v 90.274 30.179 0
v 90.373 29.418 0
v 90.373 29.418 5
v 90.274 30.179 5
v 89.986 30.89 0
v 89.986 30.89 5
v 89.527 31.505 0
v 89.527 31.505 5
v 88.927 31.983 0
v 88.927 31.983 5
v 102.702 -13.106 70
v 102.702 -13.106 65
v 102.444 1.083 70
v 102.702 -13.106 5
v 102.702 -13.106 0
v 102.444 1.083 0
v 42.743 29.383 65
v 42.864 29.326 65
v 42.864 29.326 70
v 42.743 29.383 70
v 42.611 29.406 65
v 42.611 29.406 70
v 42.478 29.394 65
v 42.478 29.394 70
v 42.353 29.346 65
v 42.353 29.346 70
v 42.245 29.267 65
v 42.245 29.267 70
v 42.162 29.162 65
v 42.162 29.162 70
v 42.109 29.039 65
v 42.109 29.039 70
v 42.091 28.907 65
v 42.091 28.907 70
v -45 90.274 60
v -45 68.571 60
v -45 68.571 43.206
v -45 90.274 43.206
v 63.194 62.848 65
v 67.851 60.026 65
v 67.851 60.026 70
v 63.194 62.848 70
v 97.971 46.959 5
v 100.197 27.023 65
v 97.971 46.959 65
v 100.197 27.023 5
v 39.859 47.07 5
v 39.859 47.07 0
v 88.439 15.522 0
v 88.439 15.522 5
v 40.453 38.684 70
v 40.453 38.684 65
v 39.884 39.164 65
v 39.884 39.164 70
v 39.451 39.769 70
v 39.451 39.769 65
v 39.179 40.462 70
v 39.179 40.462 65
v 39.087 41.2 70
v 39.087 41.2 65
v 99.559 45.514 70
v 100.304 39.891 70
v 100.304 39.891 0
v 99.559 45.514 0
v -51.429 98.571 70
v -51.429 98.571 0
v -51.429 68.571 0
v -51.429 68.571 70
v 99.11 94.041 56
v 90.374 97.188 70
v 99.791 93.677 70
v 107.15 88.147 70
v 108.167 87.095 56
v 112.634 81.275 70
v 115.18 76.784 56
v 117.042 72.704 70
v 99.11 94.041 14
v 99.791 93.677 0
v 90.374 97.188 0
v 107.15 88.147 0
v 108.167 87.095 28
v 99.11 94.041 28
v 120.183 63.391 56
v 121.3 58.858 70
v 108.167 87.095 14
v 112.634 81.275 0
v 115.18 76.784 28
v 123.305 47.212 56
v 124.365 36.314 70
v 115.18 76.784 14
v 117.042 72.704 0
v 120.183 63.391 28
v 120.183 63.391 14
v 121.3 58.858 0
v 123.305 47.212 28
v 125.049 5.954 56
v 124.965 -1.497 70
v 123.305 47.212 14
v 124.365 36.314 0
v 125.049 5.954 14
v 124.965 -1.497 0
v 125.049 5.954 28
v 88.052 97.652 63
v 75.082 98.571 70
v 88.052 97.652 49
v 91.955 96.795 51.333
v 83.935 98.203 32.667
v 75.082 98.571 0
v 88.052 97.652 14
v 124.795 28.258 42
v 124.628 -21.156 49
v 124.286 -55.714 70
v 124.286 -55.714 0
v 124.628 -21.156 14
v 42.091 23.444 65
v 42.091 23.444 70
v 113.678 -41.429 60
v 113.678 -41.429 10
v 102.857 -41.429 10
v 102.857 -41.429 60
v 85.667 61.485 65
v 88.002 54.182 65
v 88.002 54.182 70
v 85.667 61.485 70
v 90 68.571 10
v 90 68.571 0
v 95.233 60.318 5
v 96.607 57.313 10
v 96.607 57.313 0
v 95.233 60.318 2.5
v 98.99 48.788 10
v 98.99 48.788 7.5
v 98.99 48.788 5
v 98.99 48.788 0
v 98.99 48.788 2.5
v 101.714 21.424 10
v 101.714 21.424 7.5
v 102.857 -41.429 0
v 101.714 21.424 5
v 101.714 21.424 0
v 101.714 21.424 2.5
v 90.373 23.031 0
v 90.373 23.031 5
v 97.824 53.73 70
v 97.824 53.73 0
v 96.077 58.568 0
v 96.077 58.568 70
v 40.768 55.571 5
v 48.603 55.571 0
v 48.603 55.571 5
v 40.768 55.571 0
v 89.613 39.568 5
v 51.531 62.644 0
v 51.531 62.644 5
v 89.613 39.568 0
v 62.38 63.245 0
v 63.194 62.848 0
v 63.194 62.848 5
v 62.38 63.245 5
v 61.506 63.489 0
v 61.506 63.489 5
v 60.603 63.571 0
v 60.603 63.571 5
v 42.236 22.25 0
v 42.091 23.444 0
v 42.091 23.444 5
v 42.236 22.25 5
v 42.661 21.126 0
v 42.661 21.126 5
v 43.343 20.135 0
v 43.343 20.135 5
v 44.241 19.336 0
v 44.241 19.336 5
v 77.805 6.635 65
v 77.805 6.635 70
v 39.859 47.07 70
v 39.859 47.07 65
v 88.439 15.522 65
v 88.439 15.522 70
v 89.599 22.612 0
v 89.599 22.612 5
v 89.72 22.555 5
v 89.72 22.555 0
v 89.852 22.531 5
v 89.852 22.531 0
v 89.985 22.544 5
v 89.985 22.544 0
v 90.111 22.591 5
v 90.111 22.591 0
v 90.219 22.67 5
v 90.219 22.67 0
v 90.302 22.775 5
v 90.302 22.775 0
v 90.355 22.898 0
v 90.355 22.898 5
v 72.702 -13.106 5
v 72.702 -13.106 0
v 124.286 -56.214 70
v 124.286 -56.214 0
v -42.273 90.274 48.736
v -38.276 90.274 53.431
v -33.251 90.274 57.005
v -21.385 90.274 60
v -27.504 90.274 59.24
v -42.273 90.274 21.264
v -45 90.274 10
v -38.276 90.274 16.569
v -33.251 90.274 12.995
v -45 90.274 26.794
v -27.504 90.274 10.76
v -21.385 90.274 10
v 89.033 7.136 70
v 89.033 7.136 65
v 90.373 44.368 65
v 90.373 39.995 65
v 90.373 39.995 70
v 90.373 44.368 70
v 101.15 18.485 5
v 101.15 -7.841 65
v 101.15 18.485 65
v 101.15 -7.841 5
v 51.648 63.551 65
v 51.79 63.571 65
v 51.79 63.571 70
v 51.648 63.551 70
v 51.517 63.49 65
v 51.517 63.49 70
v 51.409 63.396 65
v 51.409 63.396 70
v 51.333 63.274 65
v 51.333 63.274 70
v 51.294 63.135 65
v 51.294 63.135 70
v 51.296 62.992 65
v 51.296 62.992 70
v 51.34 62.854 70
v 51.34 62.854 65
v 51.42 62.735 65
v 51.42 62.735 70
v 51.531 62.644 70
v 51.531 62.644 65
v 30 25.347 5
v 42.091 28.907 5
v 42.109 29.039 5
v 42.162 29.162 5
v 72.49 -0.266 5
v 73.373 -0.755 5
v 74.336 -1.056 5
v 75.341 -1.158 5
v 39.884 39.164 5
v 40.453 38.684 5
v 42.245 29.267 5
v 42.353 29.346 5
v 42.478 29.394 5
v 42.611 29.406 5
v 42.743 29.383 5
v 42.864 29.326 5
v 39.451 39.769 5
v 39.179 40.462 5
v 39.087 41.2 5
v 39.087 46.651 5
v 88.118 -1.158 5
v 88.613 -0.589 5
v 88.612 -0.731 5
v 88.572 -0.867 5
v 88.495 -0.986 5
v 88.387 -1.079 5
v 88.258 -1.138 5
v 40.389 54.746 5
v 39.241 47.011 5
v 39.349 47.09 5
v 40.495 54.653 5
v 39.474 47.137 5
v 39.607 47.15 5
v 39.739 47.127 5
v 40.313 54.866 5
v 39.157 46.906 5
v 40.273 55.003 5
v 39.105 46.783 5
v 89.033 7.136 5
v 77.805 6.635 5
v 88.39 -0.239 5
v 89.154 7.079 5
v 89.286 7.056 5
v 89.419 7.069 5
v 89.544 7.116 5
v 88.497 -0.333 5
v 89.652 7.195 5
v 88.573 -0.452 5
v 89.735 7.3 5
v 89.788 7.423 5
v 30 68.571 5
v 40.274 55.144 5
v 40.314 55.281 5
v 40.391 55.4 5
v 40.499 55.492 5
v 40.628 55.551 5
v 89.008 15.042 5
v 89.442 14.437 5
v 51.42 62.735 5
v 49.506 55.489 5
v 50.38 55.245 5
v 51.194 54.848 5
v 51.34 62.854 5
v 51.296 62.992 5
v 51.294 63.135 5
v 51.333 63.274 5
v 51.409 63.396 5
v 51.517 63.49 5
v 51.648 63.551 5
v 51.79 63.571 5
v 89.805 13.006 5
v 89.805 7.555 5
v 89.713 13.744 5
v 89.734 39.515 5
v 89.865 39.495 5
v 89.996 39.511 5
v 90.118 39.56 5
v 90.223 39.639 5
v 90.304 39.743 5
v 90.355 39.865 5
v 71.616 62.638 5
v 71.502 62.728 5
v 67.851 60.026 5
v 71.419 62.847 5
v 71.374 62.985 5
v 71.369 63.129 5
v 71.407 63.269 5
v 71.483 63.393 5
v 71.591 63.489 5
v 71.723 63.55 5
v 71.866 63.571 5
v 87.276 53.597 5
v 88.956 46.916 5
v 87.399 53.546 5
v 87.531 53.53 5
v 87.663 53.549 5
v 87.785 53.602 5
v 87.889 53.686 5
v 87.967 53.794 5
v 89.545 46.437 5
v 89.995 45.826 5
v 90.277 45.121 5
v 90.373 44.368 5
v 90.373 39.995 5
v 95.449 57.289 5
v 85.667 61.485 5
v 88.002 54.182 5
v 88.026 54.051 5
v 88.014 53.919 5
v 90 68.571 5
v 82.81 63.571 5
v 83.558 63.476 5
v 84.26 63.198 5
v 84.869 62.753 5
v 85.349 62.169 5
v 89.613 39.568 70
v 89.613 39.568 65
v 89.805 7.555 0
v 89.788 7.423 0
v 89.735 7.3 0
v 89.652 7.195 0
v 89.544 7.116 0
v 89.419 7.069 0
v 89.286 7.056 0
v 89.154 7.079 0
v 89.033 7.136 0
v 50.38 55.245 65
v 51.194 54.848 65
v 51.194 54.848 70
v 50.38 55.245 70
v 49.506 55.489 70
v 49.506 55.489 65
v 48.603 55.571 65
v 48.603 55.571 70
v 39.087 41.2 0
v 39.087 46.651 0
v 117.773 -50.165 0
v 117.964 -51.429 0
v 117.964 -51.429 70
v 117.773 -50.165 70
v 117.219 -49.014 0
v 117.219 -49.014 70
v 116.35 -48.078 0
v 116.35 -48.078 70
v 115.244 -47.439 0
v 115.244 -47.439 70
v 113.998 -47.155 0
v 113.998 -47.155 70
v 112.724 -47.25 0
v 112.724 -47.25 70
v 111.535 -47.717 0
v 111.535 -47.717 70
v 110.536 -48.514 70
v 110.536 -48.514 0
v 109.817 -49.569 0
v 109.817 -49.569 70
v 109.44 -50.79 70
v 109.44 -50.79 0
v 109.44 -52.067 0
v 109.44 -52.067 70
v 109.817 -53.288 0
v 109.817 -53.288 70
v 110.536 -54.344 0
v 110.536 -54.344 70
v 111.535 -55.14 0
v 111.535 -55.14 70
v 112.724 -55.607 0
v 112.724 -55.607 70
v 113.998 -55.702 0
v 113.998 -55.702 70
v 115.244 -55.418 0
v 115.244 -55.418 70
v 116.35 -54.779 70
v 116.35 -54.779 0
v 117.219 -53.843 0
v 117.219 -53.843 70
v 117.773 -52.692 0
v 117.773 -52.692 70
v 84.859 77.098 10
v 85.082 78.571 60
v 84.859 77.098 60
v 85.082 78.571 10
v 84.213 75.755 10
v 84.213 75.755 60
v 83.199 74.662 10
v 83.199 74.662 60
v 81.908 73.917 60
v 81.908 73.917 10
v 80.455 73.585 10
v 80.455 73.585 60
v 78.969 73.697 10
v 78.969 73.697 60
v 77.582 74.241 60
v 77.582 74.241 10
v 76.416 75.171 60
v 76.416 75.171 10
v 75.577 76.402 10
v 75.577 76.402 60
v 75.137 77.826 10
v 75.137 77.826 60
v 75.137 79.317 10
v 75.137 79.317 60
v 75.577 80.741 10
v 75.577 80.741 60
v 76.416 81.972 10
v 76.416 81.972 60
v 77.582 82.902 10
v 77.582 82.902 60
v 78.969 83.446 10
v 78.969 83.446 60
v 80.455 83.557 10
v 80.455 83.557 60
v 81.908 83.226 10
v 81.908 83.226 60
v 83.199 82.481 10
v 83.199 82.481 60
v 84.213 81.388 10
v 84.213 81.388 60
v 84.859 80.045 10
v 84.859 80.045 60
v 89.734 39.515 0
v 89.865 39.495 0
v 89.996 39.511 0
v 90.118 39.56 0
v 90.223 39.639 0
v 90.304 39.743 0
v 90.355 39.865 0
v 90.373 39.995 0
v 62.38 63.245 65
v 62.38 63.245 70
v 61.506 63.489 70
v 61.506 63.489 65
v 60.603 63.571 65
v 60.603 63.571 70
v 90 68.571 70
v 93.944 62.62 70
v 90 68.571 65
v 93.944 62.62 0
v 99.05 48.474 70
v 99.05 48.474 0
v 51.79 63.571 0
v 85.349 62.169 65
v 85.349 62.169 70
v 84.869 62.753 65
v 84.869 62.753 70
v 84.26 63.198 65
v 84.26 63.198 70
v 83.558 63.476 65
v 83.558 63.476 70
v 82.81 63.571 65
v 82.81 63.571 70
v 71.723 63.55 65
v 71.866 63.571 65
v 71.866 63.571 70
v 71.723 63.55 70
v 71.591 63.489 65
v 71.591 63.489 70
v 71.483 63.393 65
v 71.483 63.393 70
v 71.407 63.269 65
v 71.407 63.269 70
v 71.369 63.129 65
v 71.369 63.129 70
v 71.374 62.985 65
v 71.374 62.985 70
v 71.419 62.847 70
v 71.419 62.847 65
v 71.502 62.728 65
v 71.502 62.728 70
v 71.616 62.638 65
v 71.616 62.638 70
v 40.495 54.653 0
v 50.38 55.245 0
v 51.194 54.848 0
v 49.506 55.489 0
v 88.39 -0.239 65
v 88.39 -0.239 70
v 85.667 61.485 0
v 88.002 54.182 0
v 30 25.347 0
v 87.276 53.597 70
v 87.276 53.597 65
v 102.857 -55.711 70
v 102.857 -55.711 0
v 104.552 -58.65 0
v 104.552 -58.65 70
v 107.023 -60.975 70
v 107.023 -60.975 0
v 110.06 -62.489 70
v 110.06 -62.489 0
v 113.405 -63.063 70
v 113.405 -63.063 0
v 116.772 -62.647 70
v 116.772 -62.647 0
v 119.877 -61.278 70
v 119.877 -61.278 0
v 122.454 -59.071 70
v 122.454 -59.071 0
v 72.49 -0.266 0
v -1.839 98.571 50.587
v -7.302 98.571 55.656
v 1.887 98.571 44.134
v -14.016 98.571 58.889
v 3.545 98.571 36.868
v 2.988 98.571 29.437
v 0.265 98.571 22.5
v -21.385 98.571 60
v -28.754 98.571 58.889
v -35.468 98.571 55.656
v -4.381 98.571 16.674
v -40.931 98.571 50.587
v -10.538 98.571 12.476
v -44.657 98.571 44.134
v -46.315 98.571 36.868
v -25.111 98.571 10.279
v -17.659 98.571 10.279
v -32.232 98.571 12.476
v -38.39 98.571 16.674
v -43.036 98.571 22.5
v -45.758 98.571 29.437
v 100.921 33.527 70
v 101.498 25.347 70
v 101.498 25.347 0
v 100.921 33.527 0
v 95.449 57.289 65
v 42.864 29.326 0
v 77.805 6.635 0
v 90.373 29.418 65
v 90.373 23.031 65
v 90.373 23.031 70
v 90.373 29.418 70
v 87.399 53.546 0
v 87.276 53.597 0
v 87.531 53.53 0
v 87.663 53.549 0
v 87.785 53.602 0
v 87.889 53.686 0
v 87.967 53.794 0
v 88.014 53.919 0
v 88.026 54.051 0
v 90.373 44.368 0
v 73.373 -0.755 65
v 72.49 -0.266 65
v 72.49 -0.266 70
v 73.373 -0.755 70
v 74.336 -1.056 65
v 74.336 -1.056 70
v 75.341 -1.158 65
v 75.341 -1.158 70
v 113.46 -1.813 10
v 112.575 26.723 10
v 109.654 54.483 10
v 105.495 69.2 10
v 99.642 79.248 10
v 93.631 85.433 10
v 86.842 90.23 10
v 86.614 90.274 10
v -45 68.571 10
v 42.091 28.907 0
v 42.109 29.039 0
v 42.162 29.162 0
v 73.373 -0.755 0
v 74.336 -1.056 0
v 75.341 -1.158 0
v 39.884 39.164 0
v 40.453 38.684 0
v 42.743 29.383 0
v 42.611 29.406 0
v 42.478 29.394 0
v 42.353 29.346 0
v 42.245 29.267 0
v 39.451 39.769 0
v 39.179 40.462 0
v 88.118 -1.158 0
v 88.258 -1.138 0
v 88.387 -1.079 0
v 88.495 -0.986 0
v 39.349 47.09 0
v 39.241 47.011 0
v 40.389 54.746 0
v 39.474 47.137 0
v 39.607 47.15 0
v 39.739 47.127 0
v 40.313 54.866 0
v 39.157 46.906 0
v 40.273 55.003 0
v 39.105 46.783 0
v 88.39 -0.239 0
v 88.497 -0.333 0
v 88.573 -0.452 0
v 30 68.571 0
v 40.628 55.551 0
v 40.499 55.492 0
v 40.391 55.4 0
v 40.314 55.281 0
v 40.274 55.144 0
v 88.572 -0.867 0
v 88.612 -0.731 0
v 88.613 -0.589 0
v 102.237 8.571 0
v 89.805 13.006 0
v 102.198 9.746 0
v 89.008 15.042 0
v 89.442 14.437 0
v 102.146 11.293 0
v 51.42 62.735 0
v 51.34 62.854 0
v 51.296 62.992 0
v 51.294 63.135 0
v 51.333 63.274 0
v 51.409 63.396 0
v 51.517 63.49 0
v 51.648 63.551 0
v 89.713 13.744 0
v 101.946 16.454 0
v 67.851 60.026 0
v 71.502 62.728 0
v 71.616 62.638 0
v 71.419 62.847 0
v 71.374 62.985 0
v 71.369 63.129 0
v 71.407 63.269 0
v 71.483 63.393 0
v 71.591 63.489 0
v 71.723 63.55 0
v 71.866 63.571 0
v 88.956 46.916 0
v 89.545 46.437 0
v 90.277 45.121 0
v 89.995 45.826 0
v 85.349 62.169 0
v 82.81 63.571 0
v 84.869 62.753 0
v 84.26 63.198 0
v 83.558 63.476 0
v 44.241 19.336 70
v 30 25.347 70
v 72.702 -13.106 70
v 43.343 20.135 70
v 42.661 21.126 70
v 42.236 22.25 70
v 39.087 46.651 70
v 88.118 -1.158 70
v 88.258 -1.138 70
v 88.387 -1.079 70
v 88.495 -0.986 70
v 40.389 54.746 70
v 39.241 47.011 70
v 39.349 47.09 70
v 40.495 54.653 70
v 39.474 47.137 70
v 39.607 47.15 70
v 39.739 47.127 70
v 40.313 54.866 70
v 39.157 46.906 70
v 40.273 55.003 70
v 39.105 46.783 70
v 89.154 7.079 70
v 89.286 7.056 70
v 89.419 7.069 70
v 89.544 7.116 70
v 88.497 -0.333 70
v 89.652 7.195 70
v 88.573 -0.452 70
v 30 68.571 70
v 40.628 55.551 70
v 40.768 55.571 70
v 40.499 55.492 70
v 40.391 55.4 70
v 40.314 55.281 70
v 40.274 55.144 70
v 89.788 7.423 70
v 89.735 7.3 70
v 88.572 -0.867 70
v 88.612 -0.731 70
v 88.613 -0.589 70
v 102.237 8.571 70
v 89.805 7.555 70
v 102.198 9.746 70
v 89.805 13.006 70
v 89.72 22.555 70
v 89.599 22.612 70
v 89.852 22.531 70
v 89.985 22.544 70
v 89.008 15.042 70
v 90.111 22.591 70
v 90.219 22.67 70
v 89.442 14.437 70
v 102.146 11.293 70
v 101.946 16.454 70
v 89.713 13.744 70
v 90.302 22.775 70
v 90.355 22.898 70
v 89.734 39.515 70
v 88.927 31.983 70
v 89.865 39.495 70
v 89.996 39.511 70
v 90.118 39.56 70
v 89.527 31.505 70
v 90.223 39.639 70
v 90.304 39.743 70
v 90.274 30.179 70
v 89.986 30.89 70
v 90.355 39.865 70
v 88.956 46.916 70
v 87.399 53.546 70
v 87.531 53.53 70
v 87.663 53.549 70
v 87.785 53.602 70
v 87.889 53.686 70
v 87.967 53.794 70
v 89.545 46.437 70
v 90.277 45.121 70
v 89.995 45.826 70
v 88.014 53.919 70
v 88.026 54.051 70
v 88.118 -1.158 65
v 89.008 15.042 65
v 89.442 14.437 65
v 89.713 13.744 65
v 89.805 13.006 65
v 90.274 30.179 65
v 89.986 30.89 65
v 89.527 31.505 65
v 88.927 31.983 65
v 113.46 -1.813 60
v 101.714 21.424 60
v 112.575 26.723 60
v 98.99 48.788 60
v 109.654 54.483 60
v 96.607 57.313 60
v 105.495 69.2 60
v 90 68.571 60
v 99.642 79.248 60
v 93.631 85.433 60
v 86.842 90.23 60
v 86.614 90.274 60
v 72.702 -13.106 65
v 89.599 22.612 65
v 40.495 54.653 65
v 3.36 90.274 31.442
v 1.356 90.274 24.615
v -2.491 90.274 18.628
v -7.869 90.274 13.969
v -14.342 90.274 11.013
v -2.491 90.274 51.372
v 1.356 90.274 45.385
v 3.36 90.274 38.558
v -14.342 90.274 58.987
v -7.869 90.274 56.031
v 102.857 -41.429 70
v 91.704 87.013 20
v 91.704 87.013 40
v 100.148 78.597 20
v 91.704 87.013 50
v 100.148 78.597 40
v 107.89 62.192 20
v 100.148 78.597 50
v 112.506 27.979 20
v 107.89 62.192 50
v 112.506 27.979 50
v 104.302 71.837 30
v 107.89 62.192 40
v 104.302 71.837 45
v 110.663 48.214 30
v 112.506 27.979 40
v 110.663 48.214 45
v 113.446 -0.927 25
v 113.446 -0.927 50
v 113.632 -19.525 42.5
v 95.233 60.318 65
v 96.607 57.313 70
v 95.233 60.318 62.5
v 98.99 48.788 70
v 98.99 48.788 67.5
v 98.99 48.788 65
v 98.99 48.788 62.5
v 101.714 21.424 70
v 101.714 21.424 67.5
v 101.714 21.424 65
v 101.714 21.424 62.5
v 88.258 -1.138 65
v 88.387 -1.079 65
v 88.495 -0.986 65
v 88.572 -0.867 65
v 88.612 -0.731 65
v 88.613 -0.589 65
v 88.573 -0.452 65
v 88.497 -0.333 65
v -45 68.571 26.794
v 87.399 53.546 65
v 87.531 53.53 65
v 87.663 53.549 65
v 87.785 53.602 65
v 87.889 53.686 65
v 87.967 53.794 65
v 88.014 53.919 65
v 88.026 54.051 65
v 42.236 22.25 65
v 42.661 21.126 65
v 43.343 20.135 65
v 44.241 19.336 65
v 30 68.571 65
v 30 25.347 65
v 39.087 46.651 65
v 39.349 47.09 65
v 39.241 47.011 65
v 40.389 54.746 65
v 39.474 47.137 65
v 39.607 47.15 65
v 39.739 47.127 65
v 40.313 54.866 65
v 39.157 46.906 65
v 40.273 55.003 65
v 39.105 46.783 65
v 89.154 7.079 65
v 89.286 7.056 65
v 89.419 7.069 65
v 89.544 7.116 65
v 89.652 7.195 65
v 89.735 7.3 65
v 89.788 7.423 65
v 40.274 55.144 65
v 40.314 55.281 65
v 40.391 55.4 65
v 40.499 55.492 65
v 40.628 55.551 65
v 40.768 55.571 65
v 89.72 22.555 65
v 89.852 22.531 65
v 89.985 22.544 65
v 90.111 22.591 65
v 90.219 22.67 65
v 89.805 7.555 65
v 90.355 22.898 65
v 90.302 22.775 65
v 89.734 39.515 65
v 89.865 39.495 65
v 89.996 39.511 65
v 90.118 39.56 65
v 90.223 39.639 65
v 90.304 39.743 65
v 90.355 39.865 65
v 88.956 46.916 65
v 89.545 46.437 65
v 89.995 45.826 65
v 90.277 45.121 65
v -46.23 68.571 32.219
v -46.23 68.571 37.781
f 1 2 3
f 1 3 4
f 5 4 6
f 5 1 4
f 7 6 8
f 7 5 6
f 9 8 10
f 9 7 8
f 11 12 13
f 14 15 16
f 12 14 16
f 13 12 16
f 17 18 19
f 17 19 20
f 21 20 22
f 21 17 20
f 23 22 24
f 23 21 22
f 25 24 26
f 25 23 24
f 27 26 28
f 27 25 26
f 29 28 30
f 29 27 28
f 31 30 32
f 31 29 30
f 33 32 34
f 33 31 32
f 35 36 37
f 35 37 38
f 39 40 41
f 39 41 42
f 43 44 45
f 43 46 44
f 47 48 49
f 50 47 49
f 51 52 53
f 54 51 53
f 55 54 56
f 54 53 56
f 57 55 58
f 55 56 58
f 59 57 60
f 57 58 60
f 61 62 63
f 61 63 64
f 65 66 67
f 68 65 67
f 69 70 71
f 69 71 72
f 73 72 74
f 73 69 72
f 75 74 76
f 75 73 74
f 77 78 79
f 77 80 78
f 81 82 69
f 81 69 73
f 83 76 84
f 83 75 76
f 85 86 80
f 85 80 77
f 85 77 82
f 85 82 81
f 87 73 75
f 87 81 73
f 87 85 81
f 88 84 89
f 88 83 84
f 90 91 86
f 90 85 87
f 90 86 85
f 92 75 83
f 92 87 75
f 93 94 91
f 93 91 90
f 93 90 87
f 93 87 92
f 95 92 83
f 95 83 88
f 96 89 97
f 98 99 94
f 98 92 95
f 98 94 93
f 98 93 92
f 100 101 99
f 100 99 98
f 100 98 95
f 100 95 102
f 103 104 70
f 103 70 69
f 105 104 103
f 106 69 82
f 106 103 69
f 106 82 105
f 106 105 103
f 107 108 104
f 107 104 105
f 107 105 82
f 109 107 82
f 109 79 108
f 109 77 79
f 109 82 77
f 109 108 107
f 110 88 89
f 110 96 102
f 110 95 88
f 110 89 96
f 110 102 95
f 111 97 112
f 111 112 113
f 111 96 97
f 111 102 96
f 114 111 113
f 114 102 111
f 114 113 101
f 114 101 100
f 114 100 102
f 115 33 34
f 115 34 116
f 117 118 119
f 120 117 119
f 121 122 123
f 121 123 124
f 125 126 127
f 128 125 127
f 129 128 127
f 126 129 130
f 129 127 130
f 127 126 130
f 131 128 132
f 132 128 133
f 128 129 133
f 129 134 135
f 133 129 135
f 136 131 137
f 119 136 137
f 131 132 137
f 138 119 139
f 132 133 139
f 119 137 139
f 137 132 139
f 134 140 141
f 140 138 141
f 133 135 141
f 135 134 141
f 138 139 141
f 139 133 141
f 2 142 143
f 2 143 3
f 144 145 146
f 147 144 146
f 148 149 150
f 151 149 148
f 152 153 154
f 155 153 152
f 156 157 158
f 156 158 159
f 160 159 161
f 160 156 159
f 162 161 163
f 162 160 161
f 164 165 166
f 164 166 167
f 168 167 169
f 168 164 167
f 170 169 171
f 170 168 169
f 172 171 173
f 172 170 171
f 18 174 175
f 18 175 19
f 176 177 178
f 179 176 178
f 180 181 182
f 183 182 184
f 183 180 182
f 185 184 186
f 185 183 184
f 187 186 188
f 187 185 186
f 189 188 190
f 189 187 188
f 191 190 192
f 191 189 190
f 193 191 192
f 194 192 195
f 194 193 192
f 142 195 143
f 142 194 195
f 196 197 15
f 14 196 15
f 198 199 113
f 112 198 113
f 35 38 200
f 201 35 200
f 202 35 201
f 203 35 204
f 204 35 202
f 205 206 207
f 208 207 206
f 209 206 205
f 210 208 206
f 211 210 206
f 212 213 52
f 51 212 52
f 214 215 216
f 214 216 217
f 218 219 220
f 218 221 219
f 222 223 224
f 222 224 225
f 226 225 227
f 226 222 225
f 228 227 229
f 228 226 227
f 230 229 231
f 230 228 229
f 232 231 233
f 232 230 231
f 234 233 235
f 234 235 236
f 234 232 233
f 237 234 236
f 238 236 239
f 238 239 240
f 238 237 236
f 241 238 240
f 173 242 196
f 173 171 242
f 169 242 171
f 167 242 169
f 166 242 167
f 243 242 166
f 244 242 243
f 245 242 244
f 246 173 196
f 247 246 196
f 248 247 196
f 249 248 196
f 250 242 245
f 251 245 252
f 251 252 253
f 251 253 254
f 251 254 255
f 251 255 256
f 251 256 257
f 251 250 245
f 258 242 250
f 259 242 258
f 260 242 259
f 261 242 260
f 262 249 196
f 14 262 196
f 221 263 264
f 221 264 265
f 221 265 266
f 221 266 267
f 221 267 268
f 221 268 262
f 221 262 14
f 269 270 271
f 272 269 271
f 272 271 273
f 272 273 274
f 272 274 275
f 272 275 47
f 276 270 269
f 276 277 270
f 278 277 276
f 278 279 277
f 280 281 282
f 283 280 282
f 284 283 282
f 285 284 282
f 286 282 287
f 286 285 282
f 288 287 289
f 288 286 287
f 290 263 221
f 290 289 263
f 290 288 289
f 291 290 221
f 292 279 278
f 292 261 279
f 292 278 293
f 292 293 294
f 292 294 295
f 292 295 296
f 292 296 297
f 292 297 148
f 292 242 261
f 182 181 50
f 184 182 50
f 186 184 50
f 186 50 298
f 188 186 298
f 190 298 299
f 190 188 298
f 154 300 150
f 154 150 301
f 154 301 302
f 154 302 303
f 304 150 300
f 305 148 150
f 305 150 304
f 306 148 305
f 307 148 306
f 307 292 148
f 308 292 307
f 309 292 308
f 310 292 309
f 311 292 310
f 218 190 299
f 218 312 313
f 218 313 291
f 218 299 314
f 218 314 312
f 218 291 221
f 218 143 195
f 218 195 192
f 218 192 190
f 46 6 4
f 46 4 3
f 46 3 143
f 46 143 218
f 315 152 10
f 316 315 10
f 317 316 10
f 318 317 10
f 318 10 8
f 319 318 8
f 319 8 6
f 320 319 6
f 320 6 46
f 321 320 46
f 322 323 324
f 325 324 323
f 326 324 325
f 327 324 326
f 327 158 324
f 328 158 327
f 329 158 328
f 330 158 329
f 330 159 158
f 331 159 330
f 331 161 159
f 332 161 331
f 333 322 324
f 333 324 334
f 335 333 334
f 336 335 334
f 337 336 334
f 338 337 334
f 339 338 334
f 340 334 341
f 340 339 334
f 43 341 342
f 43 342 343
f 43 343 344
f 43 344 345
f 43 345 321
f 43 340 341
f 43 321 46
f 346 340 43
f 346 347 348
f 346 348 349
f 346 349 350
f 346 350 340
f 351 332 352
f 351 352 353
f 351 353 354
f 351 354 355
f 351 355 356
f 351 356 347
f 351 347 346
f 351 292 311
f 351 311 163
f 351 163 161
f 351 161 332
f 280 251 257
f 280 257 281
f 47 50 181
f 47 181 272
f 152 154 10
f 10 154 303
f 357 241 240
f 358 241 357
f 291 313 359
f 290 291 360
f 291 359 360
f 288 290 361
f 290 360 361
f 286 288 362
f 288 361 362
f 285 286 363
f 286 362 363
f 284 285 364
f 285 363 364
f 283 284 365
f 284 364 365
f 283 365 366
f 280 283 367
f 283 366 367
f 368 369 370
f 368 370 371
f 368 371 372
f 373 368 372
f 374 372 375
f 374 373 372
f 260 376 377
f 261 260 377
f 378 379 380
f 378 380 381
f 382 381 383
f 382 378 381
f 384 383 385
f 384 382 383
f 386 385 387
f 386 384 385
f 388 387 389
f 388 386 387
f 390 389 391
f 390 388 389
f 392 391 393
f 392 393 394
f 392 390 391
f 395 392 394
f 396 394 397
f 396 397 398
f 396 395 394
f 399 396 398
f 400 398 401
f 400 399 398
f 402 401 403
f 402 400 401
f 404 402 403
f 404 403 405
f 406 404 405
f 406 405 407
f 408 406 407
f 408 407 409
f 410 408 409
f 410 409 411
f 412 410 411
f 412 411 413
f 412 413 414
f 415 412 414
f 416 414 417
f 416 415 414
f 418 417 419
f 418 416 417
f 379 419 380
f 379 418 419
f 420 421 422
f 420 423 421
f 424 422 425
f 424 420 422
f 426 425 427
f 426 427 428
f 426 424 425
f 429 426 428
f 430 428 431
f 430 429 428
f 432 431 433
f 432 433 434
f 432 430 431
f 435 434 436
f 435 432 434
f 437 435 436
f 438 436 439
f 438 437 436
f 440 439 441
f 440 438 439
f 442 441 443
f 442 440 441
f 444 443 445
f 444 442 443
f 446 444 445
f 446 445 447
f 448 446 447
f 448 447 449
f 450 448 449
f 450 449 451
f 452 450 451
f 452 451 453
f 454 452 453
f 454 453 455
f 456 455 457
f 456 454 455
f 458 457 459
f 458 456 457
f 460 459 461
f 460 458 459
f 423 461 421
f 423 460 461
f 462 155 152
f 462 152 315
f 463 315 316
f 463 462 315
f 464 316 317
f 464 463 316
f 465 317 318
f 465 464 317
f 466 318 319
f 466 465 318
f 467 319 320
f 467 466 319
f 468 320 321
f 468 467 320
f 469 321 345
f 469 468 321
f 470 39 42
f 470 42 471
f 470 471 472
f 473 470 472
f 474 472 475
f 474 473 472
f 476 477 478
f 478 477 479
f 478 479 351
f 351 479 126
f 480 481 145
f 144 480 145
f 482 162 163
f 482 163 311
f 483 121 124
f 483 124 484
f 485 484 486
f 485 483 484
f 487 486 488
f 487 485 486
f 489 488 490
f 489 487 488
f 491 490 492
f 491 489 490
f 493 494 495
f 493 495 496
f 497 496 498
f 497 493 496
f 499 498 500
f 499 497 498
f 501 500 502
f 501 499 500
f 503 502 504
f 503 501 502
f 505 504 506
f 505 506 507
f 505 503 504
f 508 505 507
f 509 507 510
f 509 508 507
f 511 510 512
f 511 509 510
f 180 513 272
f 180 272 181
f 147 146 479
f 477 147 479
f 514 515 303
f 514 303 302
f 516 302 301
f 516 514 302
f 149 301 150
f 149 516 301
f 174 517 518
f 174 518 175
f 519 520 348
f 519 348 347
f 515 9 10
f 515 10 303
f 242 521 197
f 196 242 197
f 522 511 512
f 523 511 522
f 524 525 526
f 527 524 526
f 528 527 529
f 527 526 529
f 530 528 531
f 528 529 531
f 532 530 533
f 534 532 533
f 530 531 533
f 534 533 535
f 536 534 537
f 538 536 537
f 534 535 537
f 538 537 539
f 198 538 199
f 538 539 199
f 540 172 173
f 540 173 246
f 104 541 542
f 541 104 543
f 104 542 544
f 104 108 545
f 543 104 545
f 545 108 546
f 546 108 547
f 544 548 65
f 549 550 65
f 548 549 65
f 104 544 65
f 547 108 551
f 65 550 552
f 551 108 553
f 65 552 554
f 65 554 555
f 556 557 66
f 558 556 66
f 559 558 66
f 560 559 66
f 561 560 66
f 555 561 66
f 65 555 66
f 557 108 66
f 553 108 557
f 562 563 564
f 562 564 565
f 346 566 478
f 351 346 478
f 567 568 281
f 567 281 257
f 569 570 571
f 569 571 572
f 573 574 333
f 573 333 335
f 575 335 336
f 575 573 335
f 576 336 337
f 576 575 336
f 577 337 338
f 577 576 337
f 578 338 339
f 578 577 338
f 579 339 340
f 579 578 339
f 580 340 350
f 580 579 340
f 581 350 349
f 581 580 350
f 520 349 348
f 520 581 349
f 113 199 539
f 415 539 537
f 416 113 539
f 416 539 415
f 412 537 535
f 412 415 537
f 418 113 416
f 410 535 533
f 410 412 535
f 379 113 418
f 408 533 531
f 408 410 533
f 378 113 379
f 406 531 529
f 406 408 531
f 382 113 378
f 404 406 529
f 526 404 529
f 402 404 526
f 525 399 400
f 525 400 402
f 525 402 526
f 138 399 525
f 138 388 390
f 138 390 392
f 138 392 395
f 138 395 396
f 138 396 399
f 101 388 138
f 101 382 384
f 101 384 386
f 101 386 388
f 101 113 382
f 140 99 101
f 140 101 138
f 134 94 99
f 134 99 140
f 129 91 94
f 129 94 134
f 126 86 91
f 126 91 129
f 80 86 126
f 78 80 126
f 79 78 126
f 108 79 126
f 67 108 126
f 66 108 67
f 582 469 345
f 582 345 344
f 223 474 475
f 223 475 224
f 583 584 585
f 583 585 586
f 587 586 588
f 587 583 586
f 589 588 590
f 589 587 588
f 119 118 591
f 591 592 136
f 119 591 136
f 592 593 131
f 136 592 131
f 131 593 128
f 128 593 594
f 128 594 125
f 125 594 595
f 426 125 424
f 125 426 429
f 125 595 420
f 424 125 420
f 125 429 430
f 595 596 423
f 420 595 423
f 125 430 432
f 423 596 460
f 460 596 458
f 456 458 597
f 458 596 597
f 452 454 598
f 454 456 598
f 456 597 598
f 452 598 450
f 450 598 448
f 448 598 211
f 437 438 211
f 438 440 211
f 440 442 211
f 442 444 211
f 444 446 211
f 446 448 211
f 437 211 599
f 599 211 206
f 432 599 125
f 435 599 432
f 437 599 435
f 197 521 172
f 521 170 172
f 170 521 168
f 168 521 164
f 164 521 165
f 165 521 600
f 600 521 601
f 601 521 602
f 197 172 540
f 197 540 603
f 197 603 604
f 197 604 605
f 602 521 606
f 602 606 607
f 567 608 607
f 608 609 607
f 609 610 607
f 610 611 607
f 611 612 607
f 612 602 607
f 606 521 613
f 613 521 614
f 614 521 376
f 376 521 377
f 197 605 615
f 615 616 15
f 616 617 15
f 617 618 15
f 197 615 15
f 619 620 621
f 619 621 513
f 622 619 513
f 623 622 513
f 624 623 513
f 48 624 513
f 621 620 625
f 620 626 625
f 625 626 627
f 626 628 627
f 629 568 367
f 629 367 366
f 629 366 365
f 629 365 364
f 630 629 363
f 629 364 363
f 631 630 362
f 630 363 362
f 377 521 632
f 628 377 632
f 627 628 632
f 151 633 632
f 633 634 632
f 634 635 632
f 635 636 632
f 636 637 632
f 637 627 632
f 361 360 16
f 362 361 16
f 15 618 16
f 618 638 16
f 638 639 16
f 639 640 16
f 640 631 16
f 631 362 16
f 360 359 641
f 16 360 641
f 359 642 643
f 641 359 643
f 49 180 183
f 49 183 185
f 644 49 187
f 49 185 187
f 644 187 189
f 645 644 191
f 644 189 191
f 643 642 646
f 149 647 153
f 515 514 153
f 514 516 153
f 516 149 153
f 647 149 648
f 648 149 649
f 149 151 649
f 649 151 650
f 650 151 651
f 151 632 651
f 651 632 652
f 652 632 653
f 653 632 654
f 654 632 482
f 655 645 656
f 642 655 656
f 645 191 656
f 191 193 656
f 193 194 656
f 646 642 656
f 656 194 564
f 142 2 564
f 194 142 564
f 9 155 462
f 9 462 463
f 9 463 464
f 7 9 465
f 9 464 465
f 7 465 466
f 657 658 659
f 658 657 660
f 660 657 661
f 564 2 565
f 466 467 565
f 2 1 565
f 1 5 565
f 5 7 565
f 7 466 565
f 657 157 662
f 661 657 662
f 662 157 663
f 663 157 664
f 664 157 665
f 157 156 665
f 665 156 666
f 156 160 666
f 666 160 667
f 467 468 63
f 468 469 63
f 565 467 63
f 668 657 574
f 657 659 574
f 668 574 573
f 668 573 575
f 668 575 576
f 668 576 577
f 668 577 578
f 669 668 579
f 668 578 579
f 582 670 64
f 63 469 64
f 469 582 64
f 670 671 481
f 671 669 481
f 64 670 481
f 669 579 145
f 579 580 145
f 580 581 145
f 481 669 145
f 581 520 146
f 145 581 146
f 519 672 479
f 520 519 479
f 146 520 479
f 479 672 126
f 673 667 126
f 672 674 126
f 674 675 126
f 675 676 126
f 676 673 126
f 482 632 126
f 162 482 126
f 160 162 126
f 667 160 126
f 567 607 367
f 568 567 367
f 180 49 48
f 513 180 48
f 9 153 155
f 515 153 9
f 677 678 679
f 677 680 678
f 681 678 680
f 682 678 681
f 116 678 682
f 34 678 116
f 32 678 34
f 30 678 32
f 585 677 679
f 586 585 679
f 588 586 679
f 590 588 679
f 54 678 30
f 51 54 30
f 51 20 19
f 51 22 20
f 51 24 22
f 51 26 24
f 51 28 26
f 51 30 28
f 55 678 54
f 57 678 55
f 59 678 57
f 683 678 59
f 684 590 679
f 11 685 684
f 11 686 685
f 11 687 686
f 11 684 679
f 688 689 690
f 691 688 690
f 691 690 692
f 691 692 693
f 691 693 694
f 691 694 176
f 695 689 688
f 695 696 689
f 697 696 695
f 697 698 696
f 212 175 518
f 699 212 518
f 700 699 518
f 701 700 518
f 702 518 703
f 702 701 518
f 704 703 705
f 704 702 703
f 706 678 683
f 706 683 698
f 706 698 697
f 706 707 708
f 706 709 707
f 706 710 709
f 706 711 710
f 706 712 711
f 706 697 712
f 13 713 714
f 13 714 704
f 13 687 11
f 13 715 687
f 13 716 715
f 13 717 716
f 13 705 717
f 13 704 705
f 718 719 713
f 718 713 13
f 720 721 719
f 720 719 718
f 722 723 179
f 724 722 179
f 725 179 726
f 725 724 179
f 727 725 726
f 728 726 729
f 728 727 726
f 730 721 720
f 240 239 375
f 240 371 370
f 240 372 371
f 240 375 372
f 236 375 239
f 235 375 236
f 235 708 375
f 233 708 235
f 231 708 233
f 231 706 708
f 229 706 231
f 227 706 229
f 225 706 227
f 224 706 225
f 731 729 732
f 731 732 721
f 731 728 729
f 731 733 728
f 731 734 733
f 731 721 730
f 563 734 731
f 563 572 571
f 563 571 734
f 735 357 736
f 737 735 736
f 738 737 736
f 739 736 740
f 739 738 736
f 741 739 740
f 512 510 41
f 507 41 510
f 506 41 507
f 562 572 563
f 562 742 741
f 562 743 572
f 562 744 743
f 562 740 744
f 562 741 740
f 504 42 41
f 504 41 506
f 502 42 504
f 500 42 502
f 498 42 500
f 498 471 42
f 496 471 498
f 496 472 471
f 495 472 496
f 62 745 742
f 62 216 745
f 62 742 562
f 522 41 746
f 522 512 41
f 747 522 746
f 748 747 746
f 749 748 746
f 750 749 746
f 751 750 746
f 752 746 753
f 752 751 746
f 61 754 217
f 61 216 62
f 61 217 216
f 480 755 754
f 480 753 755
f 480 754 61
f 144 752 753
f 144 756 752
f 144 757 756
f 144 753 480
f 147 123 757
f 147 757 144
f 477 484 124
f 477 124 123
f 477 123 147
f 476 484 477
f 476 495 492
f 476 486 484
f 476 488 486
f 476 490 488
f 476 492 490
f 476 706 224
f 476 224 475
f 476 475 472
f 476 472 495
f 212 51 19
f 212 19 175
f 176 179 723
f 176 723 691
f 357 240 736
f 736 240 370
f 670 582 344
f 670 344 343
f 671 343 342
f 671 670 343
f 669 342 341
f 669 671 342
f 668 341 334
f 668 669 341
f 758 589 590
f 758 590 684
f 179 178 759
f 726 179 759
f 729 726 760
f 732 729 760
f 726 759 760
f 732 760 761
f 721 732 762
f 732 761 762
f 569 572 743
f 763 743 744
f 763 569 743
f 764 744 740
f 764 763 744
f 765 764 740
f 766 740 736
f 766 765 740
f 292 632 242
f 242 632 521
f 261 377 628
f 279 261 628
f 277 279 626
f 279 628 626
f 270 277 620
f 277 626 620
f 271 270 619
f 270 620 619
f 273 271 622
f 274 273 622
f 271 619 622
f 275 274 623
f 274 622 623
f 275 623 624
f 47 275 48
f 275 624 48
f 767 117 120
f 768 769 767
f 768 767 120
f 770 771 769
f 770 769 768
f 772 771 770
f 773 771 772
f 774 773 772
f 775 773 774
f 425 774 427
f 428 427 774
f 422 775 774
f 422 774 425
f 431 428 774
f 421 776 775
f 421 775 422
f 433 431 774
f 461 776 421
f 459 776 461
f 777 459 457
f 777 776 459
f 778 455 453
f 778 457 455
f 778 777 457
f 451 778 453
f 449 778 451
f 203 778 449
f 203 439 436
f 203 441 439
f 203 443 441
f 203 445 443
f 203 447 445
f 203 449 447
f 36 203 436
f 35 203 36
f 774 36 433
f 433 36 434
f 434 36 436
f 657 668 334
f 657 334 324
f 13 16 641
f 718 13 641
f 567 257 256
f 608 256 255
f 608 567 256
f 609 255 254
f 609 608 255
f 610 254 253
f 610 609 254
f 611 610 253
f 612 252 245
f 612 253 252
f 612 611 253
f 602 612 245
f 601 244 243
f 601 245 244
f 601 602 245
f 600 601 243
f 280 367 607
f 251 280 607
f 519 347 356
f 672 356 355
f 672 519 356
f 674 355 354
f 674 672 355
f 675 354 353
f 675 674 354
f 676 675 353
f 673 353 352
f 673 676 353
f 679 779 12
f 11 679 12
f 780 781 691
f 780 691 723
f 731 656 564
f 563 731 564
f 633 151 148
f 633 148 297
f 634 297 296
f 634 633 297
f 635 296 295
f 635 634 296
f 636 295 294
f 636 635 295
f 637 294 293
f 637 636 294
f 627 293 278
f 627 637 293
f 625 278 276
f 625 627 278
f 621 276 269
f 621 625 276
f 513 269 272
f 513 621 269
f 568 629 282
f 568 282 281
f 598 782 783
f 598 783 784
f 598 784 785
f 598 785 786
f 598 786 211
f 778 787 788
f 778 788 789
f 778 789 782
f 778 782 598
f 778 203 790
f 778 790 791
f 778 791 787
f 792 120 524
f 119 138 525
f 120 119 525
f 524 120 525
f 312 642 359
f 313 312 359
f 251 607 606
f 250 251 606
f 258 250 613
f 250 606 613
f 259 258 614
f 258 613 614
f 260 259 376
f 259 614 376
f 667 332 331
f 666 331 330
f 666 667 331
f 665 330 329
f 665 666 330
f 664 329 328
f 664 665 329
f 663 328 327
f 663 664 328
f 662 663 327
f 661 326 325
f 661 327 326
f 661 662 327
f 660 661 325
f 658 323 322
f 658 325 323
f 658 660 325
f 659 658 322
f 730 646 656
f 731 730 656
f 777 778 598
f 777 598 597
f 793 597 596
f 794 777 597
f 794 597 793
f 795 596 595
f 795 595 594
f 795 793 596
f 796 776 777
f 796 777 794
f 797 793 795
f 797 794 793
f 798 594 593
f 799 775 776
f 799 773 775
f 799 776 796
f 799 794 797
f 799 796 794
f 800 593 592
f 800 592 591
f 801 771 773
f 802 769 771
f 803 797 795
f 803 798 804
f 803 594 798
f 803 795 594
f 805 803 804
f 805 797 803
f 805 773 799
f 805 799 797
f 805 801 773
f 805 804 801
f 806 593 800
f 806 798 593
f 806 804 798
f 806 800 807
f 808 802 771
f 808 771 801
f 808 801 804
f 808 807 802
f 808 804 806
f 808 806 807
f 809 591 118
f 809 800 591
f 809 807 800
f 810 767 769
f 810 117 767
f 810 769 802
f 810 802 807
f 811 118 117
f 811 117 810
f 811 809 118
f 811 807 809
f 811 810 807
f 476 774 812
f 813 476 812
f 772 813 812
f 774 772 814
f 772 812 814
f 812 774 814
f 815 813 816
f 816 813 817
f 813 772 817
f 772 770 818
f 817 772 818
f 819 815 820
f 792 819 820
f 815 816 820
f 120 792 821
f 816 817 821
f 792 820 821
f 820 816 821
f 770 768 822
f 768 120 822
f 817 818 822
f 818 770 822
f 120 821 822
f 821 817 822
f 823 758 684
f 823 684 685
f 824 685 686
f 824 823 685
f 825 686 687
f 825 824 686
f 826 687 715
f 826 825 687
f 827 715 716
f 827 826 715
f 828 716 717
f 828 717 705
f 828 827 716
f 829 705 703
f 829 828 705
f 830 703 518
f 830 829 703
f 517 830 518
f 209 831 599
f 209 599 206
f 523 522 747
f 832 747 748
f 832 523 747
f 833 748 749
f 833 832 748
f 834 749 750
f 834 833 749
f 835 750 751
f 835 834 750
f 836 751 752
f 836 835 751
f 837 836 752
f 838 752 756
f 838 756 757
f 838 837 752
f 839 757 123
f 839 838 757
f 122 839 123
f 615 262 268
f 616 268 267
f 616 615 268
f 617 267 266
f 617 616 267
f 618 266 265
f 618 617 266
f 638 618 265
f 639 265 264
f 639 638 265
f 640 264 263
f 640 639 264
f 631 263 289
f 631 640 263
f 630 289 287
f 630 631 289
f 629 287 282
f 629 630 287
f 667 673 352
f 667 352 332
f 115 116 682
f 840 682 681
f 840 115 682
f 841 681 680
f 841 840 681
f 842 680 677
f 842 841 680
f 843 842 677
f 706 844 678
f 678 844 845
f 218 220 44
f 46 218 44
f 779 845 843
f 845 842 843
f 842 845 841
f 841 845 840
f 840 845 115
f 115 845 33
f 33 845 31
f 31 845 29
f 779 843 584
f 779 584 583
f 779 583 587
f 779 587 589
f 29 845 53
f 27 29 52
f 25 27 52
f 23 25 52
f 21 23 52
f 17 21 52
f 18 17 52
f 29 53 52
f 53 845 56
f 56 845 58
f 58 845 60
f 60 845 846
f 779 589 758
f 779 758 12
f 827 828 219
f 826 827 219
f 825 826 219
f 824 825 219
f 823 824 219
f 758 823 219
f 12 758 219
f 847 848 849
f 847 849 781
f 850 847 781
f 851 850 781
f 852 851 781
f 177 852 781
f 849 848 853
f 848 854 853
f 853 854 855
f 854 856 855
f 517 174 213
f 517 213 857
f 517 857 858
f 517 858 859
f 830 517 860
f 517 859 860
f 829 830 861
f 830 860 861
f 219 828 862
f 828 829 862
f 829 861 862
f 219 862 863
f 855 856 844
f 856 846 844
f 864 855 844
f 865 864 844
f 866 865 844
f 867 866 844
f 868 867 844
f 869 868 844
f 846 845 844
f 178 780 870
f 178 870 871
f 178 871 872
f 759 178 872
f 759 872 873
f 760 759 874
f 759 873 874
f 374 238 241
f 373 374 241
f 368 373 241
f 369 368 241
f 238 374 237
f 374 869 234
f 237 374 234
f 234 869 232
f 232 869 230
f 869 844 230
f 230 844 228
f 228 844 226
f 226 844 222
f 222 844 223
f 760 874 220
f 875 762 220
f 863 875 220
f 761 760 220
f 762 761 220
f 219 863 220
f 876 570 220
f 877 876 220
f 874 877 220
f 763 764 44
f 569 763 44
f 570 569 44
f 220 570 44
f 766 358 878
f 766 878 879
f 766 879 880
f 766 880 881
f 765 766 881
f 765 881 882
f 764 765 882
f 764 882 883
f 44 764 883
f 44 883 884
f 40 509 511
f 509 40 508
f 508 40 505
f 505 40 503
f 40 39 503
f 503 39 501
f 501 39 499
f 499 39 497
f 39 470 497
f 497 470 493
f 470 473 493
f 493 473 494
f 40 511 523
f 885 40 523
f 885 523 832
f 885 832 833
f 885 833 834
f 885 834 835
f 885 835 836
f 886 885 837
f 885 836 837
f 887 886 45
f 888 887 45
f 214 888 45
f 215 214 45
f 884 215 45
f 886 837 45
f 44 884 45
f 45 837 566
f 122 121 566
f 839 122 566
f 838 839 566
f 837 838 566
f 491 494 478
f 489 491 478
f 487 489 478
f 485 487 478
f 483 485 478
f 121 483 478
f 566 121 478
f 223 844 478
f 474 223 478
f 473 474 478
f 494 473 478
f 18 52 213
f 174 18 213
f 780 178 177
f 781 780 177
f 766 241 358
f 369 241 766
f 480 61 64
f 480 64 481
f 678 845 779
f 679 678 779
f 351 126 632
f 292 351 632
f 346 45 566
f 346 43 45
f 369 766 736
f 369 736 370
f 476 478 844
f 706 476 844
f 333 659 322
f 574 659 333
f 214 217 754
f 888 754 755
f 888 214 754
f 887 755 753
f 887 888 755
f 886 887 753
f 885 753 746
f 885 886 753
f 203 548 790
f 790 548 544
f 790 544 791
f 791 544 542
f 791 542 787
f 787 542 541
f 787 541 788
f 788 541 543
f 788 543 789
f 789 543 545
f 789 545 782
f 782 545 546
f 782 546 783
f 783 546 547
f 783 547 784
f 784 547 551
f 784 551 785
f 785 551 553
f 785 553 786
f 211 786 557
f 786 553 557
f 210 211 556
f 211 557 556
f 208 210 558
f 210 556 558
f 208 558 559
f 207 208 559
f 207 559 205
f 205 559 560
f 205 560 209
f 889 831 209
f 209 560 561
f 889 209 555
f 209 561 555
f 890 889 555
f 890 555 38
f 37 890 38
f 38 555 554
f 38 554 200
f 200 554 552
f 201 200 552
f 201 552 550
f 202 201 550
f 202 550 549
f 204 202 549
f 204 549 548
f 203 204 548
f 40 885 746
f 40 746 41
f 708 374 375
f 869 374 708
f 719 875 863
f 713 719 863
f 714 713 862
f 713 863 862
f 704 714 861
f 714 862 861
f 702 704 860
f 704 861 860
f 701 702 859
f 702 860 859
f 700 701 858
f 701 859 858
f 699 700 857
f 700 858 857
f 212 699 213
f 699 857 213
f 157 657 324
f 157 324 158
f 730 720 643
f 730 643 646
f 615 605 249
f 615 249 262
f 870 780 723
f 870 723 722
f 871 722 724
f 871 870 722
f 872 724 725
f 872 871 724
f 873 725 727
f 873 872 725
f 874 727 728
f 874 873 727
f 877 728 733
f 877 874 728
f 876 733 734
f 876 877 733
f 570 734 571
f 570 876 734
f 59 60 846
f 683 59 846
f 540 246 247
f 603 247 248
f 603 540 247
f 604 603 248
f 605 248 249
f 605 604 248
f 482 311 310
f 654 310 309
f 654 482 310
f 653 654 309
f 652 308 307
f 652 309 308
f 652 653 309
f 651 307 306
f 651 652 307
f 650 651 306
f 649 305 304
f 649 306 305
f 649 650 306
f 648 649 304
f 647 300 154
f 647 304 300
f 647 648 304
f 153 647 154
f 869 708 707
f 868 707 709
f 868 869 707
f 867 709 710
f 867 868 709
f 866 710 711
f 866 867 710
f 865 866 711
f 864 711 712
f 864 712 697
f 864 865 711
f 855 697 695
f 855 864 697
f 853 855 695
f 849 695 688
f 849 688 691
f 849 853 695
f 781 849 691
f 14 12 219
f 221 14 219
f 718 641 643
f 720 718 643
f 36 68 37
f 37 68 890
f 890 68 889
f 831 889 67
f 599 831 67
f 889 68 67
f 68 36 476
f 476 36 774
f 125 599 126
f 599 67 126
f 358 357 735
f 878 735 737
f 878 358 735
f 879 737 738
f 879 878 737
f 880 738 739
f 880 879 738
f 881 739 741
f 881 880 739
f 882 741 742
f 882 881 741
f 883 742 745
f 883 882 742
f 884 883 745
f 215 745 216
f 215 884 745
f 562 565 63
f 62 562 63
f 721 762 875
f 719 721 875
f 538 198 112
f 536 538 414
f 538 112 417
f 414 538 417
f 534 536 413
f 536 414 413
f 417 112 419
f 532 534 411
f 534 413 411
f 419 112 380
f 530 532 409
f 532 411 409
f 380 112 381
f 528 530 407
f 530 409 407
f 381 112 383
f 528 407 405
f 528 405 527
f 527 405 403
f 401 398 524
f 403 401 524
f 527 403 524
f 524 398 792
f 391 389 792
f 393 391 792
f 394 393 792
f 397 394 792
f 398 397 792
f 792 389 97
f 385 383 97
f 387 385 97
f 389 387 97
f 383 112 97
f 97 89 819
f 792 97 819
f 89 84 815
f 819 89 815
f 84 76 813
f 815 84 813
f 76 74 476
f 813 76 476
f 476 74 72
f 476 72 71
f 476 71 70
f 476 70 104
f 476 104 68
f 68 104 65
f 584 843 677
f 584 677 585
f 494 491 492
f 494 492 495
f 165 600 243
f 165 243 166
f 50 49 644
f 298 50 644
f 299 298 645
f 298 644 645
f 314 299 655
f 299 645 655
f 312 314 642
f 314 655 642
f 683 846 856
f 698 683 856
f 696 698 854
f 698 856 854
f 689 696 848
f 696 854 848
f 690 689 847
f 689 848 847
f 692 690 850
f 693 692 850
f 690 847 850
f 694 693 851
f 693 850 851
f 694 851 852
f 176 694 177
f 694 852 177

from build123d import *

# Parameters (mm, degrees)
EXTRUDE_4_OUTLINE_R = 4.285714286
EXTRUDE_4_DEPTH     = 70
CUT_EXTRUDE_START   = -25
CUT_EXTRUDE_2_DEPTH = 50
SKETCH_7_R          = 5
EXTRUDE_5_DEPTH     = 25
EXTRUDE_6_DEPTH     = 70
CUT_EXTRUDE_6_DEPTH = 30
CUT_EXTRUDE_7_DEPTH = 70
SKETCH_8_R          = 25
CUT_EXTRUDE_8_DEPTH = 217.032803357


# Read off the part's stored shape, not the designer's step: 凸台-拉伸4, 切除-拉伸2
with BuildPart() as part:
    # 凸台-拉伸4 outline → 凸台-拉伸4 (new body)
    with BuildSketch(Plane.XY):
        with BuildLine():
            add(Edge.make_bspline(
                [(75.081633224, 98.571428571), (102.857142857, 98.571428571), (121.659276484, 92.374392302), (129.417645806, 45.243229107), (124.285714286, 23.323110609), (124.285714286, -55.714285714)],
                knots=[0, 0, 0, 0, 0, 0, 1, 1, 1, 1, 1, 1], degree=5))
            Line((75.081633224, 98.571428571), (-51.428571429, 98.571428571))
            Line((-51.428571429, 98.571428571), (-51.428571429, 68.571428571))
            Line((-51.428571429, 68.571428571), (90, 68.571428571))
            add(Edge.make_bspline(
                [(90, 68.571428571), (96.36599167, 59.54355384), (98.963568623, 54.221078955), (102.934822038, 47.492908651), (102.857142857, -41.428571429)],
                knots=[0, 0, 0, 0, 0, 1, 1, 1, 1, 1], degree=4))
            Line((102.857142857, -41.428571429), (102.857142857, -55.710657963))
            ThreePointArc((102.857142857, -55.710657963), (113.404555332, -63.062666636), (124.285714286, -56.214285714))
            Line((124.285714286, -56.214285714), (124.285714286, -55.714285714))
        make_face()
        with Locations((113.677987148, -51.428571429)):
            Circle(EXTRUDE_4_OUTLINE_R, mode=Mode.SUBTRACT)
    extrude(amount=EXTRUDE_4_DEPTH)

    # 切除-拉伸2 outline → 切除-拉伸2 (cut)
    with BuildSketch(Plane(origin=(0, 0, 35), x_dir=(-1, 0, 0), z_dir=(0, 0, -1)).offset(CUT_EXTRUDE_START)):
        with BuildLine():
            Line((45, 90.273802118), (-86.614413472, 90.273802118))
            add(Edge.make_bspline(
                [(-86.614413472, 90.273802118), (-88.360672067, 90.273802118), (-100.747489611, 79.982143538), (-111.955468631, 73.182510666), (-113.70977154, 53.381496527), (-113.677987148, -41.428571429)],
                knots=[0, 0, 0, 0, 0, 0, 1, 1, 1, 1, 1, 1], degree=5))
            Line((-113.677987148, -41.428571429), (-102.857142857, -41.428571429))
            add(Edge.make_bspline(
                [(-90, 68.571428571), (-96.36599167, 59.54355384), (-98.963568623, 54.221078955), (-102.934822038, 47.492908651), (-102.857142857, -41.428571429)],
                knots=[0, 0, 0, 0, 0, 1, 1, 1, 1, 1], degree=4))
            Line((-90, 68.571428571), (45, 68.571428571))
            Line((45, 68.571428571), (45, 90.273802118))
        make_face()
    extrude(amount=CUT_EXTRUDE_2_DEPTH, mode=Mode.SUBTRACT)

    # 草图7 → 凸台-拉伸5 (add, symmetric)
    with BuildSketch(Plane(origin=(0, 0, 35), x_dir=(-1, 0, 0), z_dir=(0, 0, -1))):
        with Locations(Location((-80.081633224, 78.571428571, 0), (0, 0, 180))):
            Circle(SKETCH_7_R)
    extrude(amount=EXTRUDE_5_DEPTH, both=True)

    # 草图8 → 切除-拉伸8 (cut, through all)
    with BuildSketch(Plane(origin=(0, 98.571428571, 0), x_dir=(1, 0, 0), z_dir=(0, 1, 0))):
        with Locations(Location((-21.385187258, -35, 0), (0, 0, 270))):
            Circle(SKETCH_8_R)
    extrude(amount=-CUT_EXTRUDE_8_DEPTH, mode=Mode.SUBTRACT)


with BuildPart() as body_2:
    # 草图9 → 凸台-拉伸6 (new body)
    with BuildSketch(Plane(origin=(0, 0, 0), x_dir=(-1, 0, 0), z_dir=(0, 0, -1))):
        Polygon((-90, 68.571428571), (-30, 68.571428571), (-30, 25.346918923), (-72.702476388, -13.106120193), (-102.702476388, -13.106120193), (-102.44444362, 1.082840235), (-102.236617695, 8.571428571), (-102.198423739, 9.746413711), (-102.145582847, 11.292681667), (-101.945866973, 16.454335633), (-101.497880218, 25.346918923), (-100.921481237, 33.526965652), (-100.303739645, 39.891169232), (-99.558557747, 45.514323537), (-99.05045056, 48.473671229), (-97.823809945, 53.730411853), (-96.076586146, 58.568173195), (-93.943653788, 62.619959209), align=None)
    extrude(amount=-EXTRUDE_6_DEPTH)

    # 草图11 → 切除-拉伸6 (cut, symmetric)
    with BuildSketch(Plane(origin=(0, 0, 35), x_dir=(-1, 0, 0), z_dir=(0, 0, -1))):
        Polygon((-30, 68.571428571), (-30, 25.346918923), (-72.702476388, -13.106120193), (-102.702476388, -13.106120193), (-101.149723015, -7.841039459), (-101.149723015, 18.484825681), (-100.196566525, 27.023468843), (-97.971172378, 46.959173747), (-95.449059012, 57.288829242), (-90, 68.571428571), align=None)
    extrude(amount=CUT_EXTRUDE_6_DEPTH, both=True, mode=Mode.SUBTRACT)

    # 草图12 → 切除-拉伸7 (cut)
    with BuildSketch(Plane(origin=(0, 0, 0), x_dir=(-1, 0, 0), z_dir=(0, 0, -1))):
        with BuildLine():
            Line((-82.809680545, 63.571428571), (-71.866025404, 63.571428571))
            ThreePointArc((-71.866025404, 63.571428571), (-71.383062491, 63.200838094), (-71.616025404, 62.63841587))
            Line((-71.616025404, 62.63841587), (-87.276191195, 53.597014935))
            ThreePointArc((-87.276191195, 53.597014935), (-87.839945672, 53.640722964), (-88.002433897, 54.182319751))
            Line((-88.002433897, 54.182319751), (-85.667136762, 61.485181257))
            ThreePointArc((-85.667136762, 61.485181257), (-84.578683364, 62.99436667), (-82.809680545, 63.571428571))
        make_face()
        with BuildLine():
            Line((-67.851473283, 60.025720365), (-63.194491567, 62.847624779))
            ThreePointArc((-63.194491567, 62.847624779), (-61.948504742, 63.387079153), (-60.60332465, 63.571428571))
            Line((-60.60332465, 63.571428571), (-51.789965005, 63.571428571))
            ThreePointArc((-51.789965005, 63.571428571), (-51.308399947, 63.205946581), (-51.530848314, 62.643808951))
            Line((-51.530848314, 62.643808951), (-89.613485287, 39.567583206))
            ThreePointArc((-89.613485287, 39.567583206), (-90.118001301, 39.559566312), (-90.372601979, 39.995202827))
            Line((-90.372601979, 39.995202827), (-90.372601979, 44.367671677))
            ThreePointArc((-90.372601979, 44.367671677), (-89.994531814, 45.825575631), (-88.955612686, 46.916019592))
            Line((-88.955612686, 46.916019592), (-67.851473283, 60.025720365))
        make_face()
        with BuildLine():
            Line((-48.60332465, 55.571428571), (-40.768432632, 55.571428571))
            ThreePointArc((-40.768432632, 55.571428571), (-40.289177357, 55.213957101), (-40.495202434, 54.652686098))
            Line((-40.495202434, 54.652686098), (-89.599371781, 22.612129473))
            ThreePointArc((-89.599371781, 22.612129473), (-90.110703744, 22.591204402), (-90.372601979, 23.030871946))
            Line((-90.372601979, 23.030871946), (-90.372601979, 29.4176591))
            ThreePointArc((-90.372601979, 29.4176591), (-89.986421067, 30.890055031), (-88.927302129, 31.983376825))
            Line((-88.927302129, 31.983376825), (-51.194491567, 54.847624779))
            ThreePointArc((-51.194491567, 54.847624779), (-49.948504742, 55.387079153), (-48.60332465, 55.571428571))
        make_face()
        with BuildLine():
            Line((-89.805499039, 13.005694634), (-89.805499039, 7.555447176))
            ThreePointArc((-89.805499039, 7.555447176), (-89.544078419, 7.11603862), (-89.033179522, 7.136111892))
            Line((-89.033179522, 7.136111892), (-40.453254672, 38.684283967))
            ThreePointArc((-40.453254672, 38.684283967), (-39.450720439, 39.76881939), (-39.087171777, 41.20029567))
            Line((-39.087171777, 41.20029567), (-39.087171777, 46.650543128))
            ThreePointArc((-39.087171777, 46.650543128), (-39.348592397, 47.089951685), (-39.859491294, 47.069878412))
            Line((-39.859491294, 47.069878412), (-88.439416144, 15.521706338))
            ThreePointArc((-88.439416144, 15.521706338), (-89.441950377, 14.437170915), (-89.805499039, 13.005694634))
        make_face()
        with BuildLine():
            Line((-77.805499039, 6.634561733), (-42.863642809, 29.32606849))
            ThreePointArc((-42.863642809, 29.32606849), (-42.352743911, 29.346141762), (-42.091323291, 28.906733206))
            Line((-42.091323291, 28.906733206), (-42.091323291, 23.443947911))
            ThreePointArc((-42.091323291, 23.443947911), (-42.661176029, 21.125803127), (-44.240841386, 19.336058805))
            Line((-44.240841386, 19.336058805), (-72.490093284, -0.266218492))
            ThreePointArc((-72.490093284, -0.266218492), (-73.847163915, -0.930092452), (-75.340575189, -1.158329385))
            Line((-75.340575189, -1.158329385), (-88.117527328, -1.158329385))
            ThreePointArc((-88.117527328, -1.158329385), (-88.596937195, -0.800337058), (-88.389846845, -0.238994101))
            Line((-88.389846845, -0.238994101), (-77.805499039, 6.634561733))
        make_face()
    extrude(amount=-CUT_EXTRUDE_7_DEPTH, mode=Mode.SUBTRACT)


solid = Compound([part.part, body_2.part])
